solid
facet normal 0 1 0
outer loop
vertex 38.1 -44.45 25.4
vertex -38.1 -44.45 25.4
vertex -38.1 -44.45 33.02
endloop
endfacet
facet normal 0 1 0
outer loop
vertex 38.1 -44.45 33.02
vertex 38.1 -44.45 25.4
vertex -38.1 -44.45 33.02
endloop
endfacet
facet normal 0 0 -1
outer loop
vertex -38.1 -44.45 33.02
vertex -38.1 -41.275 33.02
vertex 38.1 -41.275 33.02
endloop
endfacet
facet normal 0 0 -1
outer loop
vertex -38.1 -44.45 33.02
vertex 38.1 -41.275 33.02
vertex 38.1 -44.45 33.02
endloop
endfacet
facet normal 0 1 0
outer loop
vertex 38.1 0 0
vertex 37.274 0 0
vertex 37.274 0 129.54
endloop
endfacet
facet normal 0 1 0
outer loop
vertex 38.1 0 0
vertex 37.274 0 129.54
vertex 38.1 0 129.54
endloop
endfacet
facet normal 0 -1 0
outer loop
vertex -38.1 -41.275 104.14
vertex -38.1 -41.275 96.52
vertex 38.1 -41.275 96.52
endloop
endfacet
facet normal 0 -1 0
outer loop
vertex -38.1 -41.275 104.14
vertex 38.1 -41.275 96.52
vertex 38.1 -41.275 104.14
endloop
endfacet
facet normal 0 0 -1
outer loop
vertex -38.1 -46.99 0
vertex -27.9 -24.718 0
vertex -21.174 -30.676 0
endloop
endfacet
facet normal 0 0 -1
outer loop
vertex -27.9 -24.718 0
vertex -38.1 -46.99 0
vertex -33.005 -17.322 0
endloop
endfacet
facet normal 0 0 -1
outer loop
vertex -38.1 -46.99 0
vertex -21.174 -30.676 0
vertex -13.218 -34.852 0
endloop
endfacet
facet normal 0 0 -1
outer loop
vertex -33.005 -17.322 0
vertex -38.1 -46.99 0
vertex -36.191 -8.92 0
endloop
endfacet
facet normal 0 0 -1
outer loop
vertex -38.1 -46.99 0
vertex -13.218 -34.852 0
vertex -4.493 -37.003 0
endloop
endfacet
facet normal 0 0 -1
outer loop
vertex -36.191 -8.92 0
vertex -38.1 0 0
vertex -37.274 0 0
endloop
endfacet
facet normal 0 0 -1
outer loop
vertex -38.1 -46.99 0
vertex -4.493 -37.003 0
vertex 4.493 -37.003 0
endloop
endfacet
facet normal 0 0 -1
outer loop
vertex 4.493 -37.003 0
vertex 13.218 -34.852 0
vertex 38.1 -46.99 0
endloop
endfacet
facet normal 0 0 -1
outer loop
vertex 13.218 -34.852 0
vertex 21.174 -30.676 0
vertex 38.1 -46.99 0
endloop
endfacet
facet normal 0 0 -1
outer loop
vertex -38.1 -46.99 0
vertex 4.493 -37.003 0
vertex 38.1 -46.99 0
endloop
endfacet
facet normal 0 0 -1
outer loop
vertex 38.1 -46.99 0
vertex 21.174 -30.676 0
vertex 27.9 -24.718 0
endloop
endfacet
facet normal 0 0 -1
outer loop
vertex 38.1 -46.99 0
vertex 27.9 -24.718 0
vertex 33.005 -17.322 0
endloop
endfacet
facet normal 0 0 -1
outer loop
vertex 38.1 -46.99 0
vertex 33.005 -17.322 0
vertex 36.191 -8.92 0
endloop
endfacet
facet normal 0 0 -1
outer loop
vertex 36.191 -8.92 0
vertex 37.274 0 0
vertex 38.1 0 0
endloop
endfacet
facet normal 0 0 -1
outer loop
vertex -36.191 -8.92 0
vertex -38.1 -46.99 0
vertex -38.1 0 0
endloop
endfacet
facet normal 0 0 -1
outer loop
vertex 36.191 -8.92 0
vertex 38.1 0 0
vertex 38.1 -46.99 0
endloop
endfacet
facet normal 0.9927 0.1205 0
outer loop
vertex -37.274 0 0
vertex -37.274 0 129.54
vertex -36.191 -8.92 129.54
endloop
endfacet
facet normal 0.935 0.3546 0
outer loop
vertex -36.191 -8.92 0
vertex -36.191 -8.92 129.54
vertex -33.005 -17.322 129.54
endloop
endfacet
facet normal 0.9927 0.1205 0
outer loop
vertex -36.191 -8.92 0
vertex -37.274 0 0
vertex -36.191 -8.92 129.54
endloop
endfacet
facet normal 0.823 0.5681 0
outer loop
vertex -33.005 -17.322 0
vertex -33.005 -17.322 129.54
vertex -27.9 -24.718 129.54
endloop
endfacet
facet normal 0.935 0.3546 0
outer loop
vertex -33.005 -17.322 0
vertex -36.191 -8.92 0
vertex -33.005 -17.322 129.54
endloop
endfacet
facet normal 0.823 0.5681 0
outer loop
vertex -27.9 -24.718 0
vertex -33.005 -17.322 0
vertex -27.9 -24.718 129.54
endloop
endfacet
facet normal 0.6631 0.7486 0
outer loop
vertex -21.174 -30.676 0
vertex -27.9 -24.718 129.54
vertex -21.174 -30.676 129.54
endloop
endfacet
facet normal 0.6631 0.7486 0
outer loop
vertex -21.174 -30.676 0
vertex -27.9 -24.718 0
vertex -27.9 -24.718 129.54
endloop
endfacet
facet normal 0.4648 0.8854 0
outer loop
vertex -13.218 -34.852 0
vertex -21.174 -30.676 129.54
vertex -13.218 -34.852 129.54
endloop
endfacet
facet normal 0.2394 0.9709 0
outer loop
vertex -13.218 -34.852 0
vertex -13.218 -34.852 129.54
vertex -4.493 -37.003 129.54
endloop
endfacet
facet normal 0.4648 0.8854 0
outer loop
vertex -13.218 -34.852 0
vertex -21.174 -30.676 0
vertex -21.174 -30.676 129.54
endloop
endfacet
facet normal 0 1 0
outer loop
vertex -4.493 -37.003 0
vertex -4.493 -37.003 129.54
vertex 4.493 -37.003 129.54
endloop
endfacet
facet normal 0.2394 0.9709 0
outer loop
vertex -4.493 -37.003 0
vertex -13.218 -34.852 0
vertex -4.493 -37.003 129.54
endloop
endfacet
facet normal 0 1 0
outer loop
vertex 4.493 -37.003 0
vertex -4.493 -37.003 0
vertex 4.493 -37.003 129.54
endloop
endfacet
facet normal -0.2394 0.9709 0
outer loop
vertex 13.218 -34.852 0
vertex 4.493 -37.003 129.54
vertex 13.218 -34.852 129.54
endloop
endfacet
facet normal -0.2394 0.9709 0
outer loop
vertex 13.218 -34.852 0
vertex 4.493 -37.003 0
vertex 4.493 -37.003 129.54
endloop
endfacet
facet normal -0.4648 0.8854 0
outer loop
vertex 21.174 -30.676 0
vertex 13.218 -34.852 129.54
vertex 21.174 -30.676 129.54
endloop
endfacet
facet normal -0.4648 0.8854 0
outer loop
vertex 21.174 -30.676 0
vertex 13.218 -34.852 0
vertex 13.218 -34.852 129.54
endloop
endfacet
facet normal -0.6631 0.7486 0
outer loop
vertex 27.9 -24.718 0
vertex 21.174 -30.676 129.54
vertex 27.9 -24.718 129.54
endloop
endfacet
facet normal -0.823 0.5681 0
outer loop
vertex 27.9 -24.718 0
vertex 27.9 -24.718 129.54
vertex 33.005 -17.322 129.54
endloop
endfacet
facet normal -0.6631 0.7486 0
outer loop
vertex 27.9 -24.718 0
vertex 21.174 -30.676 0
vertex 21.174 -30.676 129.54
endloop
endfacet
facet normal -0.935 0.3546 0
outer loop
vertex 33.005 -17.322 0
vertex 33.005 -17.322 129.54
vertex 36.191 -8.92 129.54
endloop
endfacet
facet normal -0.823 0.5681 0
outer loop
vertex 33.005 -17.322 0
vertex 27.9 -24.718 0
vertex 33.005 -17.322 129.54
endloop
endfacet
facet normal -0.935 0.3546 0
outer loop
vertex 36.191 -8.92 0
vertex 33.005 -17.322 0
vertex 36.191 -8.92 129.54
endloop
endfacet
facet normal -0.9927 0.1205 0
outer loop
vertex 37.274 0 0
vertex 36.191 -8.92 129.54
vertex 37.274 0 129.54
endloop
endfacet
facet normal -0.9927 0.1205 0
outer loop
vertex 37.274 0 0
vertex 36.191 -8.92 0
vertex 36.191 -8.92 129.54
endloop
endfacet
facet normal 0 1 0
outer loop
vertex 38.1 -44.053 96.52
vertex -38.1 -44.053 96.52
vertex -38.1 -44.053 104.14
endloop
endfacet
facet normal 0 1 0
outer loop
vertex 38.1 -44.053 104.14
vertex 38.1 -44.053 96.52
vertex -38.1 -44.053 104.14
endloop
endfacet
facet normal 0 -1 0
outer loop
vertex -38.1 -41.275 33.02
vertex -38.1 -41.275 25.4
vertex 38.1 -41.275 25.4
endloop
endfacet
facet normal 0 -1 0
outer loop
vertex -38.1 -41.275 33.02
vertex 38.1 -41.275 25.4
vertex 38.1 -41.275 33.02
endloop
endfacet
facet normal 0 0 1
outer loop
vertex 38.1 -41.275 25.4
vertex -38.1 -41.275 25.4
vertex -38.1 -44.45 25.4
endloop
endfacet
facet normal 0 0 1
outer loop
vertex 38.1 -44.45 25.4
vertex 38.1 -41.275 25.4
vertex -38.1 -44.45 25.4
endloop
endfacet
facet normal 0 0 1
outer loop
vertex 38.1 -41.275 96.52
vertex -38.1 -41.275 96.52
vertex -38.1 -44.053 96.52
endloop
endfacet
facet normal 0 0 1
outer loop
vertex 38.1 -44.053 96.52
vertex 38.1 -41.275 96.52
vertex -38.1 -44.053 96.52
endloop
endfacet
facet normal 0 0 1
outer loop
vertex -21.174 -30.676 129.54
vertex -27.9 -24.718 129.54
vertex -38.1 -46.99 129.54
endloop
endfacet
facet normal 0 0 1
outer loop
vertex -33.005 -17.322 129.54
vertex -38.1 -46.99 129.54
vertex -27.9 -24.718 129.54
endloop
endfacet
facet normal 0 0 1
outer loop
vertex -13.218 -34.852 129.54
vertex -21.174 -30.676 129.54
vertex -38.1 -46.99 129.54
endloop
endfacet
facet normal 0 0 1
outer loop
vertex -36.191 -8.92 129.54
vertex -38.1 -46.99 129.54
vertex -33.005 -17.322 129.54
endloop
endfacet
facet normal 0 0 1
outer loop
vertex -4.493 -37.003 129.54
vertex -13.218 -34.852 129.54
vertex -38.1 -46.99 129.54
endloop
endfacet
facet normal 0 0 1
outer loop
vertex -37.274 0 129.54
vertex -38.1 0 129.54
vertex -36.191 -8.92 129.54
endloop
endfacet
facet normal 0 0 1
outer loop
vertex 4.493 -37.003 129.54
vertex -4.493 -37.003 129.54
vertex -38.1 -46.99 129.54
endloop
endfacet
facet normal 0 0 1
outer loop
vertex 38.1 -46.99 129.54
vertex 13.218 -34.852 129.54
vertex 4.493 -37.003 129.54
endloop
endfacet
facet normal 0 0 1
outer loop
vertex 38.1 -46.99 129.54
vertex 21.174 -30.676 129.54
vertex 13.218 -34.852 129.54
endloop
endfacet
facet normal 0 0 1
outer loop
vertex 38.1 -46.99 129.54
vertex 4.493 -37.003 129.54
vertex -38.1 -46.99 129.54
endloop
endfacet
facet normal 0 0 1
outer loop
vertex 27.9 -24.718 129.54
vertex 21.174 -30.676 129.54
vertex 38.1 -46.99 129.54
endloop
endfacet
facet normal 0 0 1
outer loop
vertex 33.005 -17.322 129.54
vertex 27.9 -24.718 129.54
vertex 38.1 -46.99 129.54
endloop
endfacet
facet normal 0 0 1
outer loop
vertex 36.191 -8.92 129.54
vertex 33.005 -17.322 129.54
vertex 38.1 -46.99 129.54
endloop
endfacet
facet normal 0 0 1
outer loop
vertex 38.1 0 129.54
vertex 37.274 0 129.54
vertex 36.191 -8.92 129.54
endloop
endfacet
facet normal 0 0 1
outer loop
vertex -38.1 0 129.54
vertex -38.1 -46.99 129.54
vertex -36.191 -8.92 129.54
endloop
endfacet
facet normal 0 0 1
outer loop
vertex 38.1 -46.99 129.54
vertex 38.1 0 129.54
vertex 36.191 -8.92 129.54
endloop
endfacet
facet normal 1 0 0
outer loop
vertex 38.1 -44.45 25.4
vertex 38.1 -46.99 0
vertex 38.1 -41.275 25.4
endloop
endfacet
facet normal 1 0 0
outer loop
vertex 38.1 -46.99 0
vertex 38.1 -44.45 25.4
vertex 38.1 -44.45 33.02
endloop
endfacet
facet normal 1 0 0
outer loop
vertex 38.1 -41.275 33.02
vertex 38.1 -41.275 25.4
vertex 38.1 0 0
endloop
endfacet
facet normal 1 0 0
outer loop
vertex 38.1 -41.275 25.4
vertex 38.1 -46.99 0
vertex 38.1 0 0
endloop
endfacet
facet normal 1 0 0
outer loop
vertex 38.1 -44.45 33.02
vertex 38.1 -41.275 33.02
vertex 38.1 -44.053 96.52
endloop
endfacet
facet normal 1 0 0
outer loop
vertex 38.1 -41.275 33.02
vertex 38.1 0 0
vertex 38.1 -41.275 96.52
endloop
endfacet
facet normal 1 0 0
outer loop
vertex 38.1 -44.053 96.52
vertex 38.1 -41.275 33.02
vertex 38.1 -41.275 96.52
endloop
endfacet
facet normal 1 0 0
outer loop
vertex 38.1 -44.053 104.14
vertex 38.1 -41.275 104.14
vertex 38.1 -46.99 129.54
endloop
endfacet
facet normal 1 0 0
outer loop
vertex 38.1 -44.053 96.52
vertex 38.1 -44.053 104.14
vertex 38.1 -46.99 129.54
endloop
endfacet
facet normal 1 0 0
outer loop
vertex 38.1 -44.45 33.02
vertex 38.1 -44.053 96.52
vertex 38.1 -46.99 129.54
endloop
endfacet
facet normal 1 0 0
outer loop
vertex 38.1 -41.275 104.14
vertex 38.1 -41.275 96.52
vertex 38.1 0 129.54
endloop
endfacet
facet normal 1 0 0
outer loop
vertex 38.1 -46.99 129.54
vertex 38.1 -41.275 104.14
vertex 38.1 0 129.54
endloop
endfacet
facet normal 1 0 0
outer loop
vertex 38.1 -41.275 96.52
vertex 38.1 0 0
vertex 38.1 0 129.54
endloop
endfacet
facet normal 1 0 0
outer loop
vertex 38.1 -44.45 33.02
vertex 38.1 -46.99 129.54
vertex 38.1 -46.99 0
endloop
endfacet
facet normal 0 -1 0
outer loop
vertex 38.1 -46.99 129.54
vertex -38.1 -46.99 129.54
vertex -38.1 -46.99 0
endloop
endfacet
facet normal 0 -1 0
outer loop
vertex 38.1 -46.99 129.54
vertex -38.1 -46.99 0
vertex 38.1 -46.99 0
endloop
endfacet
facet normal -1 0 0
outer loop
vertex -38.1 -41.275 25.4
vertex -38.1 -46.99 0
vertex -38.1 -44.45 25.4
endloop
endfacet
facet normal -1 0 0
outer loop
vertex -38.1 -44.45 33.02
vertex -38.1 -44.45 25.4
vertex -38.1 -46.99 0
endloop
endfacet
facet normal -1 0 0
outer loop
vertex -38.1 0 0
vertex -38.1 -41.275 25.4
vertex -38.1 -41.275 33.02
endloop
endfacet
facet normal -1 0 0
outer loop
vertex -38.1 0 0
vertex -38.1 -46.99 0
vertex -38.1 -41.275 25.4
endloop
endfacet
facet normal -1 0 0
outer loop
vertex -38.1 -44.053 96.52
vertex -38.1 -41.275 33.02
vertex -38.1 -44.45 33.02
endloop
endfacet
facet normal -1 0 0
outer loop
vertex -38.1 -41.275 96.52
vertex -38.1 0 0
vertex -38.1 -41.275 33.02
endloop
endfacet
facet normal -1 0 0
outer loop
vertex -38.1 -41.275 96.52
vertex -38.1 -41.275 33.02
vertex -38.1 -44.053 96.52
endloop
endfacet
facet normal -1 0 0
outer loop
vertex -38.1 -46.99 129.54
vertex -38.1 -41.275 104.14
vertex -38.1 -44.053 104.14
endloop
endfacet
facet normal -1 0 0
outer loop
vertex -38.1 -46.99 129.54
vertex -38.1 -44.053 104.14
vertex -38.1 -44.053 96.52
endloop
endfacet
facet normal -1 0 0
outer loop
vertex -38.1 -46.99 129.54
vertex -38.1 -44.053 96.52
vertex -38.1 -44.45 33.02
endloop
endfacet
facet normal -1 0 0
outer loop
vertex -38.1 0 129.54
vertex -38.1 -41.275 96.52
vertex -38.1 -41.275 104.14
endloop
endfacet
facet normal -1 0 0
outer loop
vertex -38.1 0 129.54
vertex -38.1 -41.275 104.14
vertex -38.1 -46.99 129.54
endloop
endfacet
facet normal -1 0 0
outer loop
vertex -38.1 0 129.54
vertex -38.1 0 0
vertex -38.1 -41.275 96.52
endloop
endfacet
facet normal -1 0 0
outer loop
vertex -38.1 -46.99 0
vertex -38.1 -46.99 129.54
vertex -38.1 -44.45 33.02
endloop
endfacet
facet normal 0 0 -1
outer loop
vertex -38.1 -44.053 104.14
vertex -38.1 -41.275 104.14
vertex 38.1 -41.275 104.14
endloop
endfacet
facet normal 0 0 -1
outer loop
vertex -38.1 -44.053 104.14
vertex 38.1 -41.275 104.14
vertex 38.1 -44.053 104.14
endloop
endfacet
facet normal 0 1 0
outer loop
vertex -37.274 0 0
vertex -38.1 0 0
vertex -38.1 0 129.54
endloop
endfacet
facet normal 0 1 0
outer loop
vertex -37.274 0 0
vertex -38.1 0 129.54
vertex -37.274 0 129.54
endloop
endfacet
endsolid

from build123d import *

# Parameters (mm, degrees)
F0_W     = 76.2
F0_H     = 129.54
F1_DEPTH = 46.99
F2_R     = 37.2745
F3_DEPTH = 129.54
F4_W     = 3.175
F4_H     = 7.62
F4_W_2   = 2.777509
F5_DEPTH = 76.2


with BuildPart() as f1:
    # F0 (on Front) → F1 (new body)
    with BuildSketch(Plane.XZ):
        with Locations((0, 64.77)):
            Rectangle(F0_W, F0_H)
    extrude(amount=F1_DEPTH)

    # F2 (on Top) → F3 (cut, through all)
    with BuildSketch(Plane.XY):
        Circle(F2_R)
    extrude(amount=F3_DEPTH, mode=Mode.SUBTRACT)

    # F4 (on face) → F5 (cut, through all)
    with BuildSketch(Plane(origin=(-38.1, 0, 0), x_dir=(0, -1, 0), z_dir=(-1, 0, 0))):
        with Locations((42.8625, 29.21)):
            Rectangle(F4_W, F4_H)
        with Locations((42.663754, 100.33)):
            Rectangle(F4_W_2, F4_H)
    extrude(amount=-F5_DEPTH, mode=Mode.SUBTRACT)


solid = f1.part
